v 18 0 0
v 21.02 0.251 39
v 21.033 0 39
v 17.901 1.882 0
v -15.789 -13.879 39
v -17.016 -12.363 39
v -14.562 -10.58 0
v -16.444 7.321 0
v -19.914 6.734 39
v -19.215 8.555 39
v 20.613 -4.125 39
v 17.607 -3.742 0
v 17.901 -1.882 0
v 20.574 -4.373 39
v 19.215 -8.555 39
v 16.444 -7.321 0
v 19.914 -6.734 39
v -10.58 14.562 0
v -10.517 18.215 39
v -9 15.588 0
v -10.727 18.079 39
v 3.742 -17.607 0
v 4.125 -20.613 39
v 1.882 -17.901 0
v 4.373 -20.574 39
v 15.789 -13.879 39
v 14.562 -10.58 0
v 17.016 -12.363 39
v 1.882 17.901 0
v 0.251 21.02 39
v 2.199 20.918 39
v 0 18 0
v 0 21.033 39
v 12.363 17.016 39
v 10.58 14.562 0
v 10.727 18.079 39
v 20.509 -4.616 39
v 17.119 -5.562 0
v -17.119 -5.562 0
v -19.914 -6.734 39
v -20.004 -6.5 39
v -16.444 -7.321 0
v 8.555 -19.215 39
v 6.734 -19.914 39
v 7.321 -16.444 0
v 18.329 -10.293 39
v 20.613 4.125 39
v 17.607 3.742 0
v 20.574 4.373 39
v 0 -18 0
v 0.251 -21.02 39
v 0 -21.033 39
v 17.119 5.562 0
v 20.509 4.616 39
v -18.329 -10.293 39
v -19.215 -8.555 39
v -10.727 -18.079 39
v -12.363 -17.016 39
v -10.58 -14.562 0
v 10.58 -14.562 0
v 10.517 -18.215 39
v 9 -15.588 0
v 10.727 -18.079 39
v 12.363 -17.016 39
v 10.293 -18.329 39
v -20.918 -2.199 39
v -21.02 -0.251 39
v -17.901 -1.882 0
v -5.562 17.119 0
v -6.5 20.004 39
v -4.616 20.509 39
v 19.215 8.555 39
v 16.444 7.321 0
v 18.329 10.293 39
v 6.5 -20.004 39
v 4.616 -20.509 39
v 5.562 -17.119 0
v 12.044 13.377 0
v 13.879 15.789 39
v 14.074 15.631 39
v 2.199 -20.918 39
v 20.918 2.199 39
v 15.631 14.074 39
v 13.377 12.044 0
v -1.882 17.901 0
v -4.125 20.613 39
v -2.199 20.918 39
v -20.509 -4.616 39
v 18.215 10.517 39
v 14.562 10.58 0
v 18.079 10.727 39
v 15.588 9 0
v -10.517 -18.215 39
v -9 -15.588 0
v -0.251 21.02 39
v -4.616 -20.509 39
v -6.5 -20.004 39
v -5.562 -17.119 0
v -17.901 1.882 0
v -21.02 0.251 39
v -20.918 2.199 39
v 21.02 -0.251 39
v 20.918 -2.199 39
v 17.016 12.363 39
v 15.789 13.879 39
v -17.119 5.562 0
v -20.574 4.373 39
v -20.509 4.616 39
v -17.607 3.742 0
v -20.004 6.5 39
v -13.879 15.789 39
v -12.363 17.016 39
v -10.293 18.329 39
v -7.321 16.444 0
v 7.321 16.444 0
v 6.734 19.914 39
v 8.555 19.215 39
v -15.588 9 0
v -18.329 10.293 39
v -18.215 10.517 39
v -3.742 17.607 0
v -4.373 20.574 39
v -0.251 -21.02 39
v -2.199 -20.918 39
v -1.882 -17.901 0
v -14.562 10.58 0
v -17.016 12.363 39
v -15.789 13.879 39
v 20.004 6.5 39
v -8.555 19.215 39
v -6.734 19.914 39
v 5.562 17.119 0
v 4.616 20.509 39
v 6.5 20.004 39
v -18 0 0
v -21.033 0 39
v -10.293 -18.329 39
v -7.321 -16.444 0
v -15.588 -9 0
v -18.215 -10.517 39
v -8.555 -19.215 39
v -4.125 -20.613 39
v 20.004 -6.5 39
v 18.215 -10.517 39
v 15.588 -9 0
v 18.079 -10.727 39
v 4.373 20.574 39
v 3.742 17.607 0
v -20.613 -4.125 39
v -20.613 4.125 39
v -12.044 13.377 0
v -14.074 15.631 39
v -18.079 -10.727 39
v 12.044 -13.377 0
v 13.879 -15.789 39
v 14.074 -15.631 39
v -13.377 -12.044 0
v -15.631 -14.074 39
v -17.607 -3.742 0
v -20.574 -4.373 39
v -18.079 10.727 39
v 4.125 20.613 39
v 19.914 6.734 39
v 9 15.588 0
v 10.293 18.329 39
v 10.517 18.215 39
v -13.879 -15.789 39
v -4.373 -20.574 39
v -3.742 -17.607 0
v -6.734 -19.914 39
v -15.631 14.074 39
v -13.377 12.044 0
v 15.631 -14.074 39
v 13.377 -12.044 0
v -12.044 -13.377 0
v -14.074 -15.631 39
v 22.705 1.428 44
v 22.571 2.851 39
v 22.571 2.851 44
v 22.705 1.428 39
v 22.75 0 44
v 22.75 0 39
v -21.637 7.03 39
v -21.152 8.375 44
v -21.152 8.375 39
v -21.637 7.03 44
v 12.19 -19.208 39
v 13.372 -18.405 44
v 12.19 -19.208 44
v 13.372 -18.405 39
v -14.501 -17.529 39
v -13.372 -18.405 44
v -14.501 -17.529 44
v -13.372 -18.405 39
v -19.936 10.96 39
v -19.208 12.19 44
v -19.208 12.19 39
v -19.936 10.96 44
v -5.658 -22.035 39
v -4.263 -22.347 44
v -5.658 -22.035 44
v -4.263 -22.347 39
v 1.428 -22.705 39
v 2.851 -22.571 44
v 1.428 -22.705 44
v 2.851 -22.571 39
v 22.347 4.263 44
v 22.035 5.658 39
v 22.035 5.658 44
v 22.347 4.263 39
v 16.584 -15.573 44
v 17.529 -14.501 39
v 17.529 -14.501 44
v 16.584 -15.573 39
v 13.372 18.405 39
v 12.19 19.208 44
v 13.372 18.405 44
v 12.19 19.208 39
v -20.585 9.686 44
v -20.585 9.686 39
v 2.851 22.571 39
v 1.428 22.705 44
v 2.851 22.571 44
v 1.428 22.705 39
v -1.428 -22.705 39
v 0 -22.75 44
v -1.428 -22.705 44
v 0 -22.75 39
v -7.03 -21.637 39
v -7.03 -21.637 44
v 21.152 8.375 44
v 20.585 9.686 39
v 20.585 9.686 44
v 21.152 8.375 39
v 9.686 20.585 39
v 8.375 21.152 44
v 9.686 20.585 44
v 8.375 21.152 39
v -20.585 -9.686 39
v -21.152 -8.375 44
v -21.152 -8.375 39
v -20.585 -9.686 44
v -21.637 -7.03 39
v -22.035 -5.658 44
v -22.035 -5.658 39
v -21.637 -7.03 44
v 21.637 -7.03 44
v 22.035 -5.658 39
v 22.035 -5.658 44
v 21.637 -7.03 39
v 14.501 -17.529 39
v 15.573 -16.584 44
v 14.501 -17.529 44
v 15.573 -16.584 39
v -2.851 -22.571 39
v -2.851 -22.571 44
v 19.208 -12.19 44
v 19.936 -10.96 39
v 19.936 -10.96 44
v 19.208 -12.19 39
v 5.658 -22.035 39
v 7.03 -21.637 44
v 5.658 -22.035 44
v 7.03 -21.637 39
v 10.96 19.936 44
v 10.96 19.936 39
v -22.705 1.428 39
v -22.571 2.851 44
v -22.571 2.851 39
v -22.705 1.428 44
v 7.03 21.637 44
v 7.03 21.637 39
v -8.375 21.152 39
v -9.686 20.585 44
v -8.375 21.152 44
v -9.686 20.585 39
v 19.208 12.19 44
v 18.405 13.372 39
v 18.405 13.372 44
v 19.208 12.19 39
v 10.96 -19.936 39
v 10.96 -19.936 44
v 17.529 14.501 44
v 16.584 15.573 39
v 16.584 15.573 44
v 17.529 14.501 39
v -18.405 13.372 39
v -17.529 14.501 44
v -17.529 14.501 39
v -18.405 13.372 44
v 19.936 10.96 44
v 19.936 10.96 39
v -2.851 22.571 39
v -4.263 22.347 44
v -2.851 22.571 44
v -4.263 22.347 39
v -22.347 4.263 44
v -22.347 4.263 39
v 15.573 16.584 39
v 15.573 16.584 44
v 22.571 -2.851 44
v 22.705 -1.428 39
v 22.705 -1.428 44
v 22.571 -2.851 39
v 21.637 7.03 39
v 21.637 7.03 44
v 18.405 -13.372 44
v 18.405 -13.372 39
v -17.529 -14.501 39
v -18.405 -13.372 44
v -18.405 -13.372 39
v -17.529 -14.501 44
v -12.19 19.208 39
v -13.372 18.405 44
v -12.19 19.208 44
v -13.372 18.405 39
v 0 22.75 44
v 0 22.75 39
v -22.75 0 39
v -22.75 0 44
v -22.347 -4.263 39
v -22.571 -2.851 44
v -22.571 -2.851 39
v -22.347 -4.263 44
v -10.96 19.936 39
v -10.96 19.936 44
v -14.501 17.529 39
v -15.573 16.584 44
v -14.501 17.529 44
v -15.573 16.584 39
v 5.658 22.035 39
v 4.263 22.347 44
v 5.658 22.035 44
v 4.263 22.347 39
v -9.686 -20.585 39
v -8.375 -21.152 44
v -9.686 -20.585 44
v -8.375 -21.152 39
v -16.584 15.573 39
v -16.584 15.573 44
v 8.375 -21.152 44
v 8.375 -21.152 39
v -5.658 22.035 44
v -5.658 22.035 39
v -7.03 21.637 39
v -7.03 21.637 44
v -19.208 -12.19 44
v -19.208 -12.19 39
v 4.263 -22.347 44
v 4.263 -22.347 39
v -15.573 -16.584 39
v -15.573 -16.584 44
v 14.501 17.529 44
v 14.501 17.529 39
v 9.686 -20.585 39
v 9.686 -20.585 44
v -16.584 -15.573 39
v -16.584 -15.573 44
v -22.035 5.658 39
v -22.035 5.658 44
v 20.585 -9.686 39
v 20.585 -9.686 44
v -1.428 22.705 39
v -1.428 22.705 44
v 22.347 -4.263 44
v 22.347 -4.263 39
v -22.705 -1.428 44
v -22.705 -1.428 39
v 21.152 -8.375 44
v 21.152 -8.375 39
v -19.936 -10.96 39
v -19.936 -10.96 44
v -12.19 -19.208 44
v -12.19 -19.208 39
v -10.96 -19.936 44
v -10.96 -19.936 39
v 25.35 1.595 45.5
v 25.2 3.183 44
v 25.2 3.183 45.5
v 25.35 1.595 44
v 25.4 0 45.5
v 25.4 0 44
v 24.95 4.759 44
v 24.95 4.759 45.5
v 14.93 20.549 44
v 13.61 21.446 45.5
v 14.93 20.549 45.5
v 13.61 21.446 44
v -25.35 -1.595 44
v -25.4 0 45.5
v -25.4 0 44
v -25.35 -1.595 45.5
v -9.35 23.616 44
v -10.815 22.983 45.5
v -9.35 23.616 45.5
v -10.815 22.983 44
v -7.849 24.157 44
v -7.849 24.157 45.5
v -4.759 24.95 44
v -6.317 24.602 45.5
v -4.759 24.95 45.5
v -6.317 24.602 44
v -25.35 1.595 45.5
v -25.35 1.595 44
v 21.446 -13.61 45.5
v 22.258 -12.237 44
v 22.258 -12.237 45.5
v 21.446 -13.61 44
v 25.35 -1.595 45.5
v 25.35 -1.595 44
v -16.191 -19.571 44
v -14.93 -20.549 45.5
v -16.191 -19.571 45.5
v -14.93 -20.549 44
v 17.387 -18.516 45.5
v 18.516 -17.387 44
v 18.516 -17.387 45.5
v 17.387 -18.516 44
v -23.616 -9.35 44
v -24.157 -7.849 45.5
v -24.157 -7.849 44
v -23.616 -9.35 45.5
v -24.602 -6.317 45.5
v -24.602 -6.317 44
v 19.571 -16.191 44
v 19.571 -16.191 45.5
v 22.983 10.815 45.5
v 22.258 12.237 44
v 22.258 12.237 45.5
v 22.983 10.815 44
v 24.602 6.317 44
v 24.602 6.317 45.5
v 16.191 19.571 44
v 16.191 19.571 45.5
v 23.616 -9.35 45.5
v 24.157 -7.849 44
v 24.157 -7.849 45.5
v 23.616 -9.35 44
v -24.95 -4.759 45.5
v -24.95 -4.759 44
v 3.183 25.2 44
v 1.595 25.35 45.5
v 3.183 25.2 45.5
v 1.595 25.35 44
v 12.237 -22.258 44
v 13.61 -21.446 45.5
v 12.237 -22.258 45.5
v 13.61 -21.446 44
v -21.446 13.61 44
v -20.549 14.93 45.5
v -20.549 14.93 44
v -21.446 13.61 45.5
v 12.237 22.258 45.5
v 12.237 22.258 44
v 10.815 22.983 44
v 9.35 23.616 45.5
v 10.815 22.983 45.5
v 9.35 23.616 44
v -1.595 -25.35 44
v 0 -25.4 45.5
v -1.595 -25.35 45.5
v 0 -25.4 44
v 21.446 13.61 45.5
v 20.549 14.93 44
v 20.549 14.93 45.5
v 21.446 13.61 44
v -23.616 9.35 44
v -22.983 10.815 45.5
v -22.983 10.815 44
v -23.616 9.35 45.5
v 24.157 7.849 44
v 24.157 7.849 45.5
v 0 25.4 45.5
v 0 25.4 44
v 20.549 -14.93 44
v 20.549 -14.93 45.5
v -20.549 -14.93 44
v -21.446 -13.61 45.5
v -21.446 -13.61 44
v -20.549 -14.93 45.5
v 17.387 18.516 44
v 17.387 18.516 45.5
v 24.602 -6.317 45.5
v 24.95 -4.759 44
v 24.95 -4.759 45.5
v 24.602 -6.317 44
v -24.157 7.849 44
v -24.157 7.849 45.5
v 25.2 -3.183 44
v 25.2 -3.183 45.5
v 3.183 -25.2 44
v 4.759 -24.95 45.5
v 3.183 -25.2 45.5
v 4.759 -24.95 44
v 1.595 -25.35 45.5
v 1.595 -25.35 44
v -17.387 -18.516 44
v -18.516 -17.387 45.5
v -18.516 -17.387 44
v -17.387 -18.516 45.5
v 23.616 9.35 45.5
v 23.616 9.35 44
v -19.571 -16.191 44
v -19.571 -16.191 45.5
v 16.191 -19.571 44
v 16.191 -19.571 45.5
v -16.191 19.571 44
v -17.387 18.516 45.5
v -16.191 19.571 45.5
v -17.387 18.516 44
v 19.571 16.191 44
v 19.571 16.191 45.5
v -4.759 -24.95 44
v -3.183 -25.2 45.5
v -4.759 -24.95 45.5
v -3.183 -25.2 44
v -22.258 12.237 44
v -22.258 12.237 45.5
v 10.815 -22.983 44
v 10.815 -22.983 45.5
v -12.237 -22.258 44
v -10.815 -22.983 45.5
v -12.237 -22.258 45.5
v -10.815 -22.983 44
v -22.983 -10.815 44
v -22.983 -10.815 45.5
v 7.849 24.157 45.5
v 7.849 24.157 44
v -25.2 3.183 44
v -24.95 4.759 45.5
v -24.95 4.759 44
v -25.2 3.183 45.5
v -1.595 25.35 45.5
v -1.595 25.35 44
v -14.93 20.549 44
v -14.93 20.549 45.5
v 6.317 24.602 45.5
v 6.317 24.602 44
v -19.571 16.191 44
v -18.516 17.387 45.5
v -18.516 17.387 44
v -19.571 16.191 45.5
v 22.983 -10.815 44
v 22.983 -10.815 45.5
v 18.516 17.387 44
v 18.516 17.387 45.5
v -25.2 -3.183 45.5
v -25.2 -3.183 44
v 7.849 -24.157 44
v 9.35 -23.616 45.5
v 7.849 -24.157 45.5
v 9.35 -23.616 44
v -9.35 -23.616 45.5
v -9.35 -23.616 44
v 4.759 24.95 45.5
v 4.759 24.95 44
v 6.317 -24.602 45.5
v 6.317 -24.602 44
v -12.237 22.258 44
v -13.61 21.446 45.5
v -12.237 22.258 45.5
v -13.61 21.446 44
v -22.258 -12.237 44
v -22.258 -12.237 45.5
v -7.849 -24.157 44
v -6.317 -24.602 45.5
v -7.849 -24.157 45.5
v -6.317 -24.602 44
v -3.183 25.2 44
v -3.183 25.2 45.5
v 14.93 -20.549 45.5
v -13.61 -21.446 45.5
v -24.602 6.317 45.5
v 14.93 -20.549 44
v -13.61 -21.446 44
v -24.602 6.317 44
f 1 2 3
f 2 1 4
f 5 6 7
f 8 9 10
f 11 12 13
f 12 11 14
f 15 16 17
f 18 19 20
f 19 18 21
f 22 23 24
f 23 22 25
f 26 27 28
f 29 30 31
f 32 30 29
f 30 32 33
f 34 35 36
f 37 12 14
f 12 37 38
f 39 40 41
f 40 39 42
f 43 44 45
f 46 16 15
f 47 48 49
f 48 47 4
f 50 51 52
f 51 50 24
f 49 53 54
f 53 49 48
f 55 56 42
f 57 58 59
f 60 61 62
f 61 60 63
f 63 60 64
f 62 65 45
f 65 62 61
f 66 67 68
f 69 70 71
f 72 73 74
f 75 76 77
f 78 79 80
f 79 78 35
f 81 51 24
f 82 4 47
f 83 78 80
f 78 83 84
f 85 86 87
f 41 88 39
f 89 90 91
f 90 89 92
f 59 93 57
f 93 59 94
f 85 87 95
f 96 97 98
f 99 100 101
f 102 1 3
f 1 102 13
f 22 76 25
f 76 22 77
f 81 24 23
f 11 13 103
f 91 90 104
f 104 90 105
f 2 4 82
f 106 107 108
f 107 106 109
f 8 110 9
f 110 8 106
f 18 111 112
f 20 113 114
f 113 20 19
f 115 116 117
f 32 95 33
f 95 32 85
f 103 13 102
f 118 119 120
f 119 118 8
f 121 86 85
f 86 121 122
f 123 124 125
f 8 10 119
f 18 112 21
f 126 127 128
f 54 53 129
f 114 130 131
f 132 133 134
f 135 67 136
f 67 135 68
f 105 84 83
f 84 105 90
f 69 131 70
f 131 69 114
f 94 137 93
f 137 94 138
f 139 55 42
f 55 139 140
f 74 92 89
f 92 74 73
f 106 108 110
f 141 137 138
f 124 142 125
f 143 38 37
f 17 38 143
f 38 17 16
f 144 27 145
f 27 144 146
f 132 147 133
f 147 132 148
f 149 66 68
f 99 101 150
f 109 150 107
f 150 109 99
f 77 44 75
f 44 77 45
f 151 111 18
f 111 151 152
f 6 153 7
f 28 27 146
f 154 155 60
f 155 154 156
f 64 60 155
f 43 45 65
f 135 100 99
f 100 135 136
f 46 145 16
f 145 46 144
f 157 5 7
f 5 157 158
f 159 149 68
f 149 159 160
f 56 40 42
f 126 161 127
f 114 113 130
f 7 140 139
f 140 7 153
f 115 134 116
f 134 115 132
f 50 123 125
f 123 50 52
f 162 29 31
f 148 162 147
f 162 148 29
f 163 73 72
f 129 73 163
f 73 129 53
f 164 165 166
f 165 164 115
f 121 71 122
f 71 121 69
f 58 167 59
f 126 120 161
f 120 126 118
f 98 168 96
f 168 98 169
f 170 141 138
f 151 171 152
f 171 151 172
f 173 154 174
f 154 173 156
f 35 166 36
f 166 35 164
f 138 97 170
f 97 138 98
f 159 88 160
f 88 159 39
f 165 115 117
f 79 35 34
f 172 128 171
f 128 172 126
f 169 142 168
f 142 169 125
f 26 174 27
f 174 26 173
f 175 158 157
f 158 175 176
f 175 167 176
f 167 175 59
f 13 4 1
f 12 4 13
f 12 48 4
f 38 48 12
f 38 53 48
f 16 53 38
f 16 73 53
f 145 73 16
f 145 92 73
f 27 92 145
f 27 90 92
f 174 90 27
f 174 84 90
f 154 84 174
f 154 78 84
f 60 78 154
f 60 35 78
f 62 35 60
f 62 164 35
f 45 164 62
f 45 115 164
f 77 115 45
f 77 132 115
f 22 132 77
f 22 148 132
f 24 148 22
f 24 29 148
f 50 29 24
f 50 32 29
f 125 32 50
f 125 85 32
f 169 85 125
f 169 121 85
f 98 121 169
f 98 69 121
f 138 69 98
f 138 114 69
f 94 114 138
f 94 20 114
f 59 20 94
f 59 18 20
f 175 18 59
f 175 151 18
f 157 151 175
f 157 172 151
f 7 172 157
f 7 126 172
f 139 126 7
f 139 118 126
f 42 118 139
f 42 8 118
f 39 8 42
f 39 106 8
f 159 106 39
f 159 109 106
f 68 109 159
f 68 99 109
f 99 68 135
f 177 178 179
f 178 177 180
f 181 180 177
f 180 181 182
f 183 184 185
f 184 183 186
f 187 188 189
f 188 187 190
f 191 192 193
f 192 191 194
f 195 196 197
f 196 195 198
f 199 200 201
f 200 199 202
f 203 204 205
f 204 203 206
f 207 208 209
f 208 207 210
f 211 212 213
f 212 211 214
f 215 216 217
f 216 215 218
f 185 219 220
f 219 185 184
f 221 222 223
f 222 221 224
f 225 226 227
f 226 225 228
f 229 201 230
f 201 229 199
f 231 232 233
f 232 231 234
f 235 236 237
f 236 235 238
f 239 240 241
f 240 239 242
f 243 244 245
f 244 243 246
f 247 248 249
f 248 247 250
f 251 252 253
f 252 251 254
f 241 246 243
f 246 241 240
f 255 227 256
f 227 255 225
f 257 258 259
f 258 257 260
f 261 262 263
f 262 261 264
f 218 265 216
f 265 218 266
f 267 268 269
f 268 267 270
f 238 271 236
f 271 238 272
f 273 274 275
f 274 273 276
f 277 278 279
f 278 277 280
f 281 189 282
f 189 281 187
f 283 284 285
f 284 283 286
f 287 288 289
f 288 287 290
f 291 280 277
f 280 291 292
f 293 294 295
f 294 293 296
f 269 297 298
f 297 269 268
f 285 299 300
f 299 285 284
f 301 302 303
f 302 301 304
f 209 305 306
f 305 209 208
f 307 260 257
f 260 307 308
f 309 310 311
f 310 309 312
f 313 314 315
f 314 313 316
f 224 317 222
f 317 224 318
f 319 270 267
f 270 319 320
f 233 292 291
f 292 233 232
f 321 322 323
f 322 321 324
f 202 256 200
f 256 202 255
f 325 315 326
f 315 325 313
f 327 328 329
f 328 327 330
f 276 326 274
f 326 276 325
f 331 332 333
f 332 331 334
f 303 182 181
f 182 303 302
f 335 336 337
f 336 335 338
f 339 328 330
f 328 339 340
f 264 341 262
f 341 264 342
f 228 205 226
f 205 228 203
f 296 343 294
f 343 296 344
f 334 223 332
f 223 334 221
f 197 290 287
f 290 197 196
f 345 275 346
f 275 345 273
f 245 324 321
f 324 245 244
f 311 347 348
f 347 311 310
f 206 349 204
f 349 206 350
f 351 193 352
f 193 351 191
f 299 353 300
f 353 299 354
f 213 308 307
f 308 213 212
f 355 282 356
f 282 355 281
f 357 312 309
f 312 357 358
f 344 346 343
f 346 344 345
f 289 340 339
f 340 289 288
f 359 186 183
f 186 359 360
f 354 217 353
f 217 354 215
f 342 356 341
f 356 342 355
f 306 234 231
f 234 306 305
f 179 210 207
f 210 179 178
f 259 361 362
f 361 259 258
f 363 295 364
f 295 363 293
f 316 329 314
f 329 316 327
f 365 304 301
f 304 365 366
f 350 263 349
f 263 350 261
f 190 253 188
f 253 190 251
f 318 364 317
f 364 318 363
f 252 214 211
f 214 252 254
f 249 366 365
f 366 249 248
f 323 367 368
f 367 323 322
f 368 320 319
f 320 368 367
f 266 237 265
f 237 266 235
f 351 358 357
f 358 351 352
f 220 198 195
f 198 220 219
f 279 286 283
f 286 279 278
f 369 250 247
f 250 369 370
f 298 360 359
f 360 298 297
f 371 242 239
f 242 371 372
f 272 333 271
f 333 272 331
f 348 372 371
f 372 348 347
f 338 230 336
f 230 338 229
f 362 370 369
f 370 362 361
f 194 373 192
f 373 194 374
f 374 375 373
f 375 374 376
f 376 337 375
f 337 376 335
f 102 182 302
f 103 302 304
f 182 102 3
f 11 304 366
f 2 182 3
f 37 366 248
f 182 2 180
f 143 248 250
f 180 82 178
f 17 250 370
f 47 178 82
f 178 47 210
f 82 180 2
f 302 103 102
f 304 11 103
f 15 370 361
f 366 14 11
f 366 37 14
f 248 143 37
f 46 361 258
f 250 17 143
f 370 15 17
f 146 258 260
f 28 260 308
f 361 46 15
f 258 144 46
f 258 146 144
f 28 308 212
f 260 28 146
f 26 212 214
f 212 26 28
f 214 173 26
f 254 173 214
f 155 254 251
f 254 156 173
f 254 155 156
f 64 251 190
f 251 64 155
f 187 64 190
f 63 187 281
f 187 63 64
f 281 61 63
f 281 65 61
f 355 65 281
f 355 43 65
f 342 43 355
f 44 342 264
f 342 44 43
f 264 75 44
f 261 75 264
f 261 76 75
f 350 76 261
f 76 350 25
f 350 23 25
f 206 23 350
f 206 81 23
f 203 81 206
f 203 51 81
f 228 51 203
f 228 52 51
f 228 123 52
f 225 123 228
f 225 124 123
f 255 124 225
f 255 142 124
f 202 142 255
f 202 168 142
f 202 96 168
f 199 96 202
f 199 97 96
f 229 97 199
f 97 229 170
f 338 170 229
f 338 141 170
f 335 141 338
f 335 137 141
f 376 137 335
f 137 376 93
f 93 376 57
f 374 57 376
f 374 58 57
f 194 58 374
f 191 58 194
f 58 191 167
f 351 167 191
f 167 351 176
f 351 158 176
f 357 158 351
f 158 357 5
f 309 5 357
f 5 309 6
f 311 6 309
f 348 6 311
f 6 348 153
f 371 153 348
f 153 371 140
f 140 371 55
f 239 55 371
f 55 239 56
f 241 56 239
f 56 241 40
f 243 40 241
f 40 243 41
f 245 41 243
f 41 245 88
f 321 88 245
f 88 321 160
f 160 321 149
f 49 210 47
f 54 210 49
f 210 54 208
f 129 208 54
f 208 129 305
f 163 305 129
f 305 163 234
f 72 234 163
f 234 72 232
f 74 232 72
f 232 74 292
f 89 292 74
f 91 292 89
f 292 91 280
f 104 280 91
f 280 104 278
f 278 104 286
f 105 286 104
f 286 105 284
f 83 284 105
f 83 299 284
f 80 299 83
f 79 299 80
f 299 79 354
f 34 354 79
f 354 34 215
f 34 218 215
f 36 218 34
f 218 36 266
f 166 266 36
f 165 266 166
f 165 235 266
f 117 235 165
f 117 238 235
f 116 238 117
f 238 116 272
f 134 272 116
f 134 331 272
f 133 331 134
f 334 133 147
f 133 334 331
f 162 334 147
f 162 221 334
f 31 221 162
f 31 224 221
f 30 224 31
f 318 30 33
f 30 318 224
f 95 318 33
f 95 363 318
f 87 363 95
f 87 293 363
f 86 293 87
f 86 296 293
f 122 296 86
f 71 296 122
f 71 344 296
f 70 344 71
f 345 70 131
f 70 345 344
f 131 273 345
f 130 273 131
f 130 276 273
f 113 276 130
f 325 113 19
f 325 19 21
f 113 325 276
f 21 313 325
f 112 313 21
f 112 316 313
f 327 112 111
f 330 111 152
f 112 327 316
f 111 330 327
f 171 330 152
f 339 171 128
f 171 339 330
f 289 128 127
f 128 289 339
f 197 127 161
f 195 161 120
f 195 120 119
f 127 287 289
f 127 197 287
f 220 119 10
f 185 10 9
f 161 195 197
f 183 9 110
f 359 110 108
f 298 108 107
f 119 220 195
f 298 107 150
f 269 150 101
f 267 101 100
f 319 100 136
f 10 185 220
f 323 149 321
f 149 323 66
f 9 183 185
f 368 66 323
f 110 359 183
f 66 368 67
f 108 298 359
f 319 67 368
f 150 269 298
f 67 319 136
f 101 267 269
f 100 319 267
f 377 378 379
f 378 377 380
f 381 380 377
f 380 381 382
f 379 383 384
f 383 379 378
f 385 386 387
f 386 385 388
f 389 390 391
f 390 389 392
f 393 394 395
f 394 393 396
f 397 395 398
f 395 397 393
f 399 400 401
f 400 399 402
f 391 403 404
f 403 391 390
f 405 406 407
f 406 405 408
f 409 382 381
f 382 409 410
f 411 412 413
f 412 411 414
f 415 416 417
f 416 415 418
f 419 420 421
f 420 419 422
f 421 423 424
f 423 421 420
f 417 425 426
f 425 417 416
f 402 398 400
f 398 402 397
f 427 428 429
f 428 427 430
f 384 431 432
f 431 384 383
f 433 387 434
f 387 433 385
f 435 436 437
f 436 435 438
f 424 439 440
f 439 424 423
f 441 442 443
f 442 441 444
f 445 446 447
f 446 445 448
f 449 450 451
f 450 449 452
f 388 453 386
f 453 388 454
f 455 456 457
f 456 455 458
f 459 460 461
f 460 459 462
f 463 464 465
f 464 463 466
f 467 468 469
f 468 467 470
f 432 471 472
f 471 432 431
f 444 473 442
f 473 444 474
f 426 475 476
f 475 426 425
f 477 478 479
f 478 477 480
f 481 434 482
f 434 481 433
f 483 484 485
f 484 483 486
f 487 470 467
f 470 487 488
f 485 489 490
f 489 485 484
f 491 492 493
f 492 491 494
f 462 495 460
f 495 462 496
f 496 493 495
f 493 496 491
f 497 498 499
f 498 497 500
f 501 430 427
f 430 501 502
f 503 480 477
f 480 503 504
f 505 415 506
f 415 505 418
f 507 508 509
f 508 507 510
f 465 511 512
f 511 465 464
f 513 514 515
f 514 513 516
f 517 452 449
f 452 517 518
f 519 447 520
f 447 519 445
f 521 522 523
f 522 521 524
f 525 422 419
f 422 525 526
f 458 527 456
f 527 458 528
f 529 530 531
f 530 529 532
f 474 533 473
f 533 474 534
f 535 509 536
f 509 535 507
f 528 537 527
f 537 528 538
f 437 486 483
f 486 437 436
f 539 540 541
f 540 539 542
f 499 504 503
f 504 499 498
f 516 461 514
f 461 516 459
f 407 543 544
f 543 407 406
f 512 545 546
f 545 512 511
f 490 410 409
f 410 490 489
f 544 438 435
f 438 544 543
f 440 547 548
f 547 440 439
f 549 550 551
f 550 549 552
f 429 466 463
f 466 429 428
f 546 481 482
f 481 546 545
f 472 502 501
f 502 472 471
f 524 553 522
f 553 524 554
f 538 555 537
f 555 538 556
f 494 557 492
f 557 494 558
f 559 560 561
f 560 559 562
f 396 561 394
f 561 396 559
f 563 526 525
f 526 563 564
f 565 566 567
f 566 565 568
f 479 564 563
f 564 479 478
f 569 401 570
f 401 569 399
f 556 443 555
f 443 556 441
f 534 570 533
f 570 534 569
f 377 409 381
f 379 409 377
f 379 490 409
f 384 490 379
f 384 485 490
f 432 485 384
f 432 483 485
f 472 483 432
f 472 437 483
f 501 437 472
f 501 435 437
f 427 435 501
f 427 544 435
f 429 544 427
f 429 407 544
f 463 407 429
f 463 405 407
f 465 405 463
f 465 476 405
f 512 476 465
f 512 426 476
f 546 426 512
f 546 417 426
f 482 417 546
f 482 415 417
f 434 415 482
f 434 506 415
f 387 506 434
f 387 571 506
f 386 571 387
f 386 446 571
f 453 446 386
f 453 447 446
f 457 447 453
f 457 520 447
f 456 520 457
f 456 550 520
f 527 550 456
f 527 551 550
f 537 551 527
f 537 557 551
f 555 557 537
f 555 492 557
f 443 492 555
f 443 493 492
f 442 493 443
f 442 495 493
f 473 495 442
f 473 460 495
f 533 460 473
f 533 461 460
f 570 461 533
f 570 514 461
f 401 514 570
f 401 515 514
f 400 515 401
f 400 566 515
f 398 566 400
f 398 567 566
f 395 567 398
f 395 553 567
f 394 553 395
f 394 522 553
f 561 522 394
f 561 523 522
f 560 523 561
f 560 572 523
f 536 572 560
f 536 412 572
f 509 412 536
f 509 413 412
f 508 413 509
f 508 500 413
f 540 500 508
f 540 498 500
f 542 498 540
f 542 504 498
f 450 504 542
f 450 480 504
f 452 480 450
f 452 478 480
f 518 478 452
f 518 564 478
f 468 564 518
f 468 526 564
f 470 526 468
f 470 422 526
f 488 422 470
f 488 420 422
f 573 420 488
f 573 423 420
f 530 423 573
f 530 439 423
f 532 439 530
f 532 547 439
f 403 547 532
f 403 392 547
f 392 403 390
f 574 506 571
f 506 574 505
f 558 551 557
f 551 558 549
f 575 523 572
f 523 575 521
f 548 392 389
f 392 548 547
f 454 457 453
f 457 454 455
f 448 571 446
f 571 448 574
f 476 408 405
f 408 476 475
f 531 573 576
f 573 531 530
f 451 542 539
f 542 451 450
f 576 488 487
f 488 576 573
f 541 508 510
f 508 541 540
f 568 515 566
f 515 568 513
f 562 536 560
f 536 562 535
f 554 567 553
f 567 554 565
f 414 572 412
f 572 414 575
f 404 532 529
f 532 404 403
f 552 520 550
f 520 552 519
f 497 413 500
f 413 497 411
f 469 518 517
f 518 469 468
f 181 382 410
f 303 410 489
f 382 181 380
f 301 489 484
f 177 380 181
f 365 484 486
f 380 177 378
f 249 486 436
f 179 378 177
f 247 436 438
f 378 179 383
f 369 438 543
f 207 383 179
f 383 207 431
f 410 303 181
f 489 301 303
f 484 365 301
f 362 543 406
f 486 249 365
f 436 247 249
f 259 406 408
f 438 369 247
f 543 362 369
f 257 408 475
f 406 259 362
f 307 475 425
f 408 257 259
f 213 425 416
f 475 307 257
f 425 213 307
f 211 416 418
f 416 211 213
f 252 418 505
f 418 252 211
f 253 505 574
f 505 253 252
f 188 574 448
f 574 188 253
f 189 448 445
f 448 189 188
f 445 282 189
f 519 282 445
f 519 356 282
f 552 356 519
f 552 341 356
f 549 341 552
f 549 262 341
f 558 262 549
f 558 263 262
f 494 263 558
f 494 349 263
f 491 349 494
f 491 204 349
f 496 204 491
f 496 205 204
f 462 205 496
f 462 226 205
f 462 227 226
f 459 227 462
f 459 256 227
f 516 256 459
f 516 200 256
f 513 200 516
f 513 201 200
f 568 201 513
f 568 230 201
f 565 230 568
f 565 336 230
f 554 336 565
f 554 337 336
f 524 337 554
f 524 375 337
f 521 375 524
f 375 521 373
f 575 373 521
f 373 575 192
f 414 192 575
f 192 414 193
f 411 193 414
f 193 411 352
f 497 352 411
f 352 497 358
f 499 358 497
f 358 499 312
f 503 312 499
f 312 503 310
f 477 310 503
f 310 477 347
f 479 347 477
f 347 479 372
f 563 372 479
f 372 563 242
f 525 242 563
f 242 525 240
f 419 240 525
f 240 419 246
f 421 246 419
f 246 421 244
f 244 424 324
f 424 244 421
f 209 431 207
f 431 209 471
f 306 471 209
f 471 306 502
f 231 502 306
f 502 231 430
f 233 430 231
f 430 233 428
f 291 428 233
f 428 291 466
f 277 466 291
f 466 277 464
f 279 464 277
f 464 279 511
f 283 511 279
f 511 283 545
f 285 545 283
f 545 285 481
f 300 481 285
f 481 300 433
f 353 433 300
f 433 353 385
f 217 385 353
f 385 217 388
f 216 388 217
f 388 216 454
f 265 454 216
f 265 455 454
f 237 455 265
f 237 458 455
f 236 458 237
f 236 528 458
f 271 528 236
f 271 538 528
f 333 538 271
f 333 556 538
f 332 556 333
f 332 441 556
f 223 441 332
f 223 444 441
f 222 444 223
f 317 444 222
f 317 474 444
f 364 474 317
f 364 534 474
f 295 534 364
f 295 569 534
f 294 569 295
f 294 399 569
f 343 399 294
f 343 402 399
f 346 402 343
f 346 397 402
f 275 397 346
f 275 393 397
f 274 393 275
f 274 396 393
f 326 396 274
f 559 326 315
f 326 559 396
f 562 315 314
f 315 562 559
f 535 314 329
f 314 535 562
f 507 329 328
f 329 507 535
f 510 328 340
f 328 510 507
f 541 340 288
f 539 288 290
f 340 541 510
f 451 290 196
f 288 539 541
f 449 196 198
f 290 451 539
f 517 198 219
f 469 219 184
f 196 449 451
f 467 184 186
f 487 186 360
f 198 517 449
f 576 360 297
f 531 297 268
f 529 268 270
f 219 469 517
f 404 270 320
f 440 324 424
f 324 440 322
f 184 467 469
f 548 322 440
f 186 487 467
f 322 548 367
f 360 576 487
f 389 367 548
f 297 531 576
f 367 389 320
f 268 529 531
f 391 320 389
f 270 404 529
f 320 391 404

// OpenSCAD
module SpaceCup() {
    difference() {
        union() {
            translate([0, 0, 0])
                rotate([0, 0, 0])
                cylinder(h = 45, r1 = 36 / 2, r2 = 43 / 2, $fn = 60, center = false);

            translate([0, 0, 45 - 6])
                rotate([0, 0, 0])
                cylinder(h = 6, r1 = 45.5 / 2, r2 = 45.5 / 2, $fn = 100, center = false);

            translate([0, 0, 45 - 1])
                rotate([0, 0, 0])
                cylinder(h = 1.5, r1 = 50.8 / 2, r2 = 50.8 / 2, $fn = 100, center = false);
        }

        // Aquí podrías añadir diferencias para detalles internos
    }
}

SpaceCup();
